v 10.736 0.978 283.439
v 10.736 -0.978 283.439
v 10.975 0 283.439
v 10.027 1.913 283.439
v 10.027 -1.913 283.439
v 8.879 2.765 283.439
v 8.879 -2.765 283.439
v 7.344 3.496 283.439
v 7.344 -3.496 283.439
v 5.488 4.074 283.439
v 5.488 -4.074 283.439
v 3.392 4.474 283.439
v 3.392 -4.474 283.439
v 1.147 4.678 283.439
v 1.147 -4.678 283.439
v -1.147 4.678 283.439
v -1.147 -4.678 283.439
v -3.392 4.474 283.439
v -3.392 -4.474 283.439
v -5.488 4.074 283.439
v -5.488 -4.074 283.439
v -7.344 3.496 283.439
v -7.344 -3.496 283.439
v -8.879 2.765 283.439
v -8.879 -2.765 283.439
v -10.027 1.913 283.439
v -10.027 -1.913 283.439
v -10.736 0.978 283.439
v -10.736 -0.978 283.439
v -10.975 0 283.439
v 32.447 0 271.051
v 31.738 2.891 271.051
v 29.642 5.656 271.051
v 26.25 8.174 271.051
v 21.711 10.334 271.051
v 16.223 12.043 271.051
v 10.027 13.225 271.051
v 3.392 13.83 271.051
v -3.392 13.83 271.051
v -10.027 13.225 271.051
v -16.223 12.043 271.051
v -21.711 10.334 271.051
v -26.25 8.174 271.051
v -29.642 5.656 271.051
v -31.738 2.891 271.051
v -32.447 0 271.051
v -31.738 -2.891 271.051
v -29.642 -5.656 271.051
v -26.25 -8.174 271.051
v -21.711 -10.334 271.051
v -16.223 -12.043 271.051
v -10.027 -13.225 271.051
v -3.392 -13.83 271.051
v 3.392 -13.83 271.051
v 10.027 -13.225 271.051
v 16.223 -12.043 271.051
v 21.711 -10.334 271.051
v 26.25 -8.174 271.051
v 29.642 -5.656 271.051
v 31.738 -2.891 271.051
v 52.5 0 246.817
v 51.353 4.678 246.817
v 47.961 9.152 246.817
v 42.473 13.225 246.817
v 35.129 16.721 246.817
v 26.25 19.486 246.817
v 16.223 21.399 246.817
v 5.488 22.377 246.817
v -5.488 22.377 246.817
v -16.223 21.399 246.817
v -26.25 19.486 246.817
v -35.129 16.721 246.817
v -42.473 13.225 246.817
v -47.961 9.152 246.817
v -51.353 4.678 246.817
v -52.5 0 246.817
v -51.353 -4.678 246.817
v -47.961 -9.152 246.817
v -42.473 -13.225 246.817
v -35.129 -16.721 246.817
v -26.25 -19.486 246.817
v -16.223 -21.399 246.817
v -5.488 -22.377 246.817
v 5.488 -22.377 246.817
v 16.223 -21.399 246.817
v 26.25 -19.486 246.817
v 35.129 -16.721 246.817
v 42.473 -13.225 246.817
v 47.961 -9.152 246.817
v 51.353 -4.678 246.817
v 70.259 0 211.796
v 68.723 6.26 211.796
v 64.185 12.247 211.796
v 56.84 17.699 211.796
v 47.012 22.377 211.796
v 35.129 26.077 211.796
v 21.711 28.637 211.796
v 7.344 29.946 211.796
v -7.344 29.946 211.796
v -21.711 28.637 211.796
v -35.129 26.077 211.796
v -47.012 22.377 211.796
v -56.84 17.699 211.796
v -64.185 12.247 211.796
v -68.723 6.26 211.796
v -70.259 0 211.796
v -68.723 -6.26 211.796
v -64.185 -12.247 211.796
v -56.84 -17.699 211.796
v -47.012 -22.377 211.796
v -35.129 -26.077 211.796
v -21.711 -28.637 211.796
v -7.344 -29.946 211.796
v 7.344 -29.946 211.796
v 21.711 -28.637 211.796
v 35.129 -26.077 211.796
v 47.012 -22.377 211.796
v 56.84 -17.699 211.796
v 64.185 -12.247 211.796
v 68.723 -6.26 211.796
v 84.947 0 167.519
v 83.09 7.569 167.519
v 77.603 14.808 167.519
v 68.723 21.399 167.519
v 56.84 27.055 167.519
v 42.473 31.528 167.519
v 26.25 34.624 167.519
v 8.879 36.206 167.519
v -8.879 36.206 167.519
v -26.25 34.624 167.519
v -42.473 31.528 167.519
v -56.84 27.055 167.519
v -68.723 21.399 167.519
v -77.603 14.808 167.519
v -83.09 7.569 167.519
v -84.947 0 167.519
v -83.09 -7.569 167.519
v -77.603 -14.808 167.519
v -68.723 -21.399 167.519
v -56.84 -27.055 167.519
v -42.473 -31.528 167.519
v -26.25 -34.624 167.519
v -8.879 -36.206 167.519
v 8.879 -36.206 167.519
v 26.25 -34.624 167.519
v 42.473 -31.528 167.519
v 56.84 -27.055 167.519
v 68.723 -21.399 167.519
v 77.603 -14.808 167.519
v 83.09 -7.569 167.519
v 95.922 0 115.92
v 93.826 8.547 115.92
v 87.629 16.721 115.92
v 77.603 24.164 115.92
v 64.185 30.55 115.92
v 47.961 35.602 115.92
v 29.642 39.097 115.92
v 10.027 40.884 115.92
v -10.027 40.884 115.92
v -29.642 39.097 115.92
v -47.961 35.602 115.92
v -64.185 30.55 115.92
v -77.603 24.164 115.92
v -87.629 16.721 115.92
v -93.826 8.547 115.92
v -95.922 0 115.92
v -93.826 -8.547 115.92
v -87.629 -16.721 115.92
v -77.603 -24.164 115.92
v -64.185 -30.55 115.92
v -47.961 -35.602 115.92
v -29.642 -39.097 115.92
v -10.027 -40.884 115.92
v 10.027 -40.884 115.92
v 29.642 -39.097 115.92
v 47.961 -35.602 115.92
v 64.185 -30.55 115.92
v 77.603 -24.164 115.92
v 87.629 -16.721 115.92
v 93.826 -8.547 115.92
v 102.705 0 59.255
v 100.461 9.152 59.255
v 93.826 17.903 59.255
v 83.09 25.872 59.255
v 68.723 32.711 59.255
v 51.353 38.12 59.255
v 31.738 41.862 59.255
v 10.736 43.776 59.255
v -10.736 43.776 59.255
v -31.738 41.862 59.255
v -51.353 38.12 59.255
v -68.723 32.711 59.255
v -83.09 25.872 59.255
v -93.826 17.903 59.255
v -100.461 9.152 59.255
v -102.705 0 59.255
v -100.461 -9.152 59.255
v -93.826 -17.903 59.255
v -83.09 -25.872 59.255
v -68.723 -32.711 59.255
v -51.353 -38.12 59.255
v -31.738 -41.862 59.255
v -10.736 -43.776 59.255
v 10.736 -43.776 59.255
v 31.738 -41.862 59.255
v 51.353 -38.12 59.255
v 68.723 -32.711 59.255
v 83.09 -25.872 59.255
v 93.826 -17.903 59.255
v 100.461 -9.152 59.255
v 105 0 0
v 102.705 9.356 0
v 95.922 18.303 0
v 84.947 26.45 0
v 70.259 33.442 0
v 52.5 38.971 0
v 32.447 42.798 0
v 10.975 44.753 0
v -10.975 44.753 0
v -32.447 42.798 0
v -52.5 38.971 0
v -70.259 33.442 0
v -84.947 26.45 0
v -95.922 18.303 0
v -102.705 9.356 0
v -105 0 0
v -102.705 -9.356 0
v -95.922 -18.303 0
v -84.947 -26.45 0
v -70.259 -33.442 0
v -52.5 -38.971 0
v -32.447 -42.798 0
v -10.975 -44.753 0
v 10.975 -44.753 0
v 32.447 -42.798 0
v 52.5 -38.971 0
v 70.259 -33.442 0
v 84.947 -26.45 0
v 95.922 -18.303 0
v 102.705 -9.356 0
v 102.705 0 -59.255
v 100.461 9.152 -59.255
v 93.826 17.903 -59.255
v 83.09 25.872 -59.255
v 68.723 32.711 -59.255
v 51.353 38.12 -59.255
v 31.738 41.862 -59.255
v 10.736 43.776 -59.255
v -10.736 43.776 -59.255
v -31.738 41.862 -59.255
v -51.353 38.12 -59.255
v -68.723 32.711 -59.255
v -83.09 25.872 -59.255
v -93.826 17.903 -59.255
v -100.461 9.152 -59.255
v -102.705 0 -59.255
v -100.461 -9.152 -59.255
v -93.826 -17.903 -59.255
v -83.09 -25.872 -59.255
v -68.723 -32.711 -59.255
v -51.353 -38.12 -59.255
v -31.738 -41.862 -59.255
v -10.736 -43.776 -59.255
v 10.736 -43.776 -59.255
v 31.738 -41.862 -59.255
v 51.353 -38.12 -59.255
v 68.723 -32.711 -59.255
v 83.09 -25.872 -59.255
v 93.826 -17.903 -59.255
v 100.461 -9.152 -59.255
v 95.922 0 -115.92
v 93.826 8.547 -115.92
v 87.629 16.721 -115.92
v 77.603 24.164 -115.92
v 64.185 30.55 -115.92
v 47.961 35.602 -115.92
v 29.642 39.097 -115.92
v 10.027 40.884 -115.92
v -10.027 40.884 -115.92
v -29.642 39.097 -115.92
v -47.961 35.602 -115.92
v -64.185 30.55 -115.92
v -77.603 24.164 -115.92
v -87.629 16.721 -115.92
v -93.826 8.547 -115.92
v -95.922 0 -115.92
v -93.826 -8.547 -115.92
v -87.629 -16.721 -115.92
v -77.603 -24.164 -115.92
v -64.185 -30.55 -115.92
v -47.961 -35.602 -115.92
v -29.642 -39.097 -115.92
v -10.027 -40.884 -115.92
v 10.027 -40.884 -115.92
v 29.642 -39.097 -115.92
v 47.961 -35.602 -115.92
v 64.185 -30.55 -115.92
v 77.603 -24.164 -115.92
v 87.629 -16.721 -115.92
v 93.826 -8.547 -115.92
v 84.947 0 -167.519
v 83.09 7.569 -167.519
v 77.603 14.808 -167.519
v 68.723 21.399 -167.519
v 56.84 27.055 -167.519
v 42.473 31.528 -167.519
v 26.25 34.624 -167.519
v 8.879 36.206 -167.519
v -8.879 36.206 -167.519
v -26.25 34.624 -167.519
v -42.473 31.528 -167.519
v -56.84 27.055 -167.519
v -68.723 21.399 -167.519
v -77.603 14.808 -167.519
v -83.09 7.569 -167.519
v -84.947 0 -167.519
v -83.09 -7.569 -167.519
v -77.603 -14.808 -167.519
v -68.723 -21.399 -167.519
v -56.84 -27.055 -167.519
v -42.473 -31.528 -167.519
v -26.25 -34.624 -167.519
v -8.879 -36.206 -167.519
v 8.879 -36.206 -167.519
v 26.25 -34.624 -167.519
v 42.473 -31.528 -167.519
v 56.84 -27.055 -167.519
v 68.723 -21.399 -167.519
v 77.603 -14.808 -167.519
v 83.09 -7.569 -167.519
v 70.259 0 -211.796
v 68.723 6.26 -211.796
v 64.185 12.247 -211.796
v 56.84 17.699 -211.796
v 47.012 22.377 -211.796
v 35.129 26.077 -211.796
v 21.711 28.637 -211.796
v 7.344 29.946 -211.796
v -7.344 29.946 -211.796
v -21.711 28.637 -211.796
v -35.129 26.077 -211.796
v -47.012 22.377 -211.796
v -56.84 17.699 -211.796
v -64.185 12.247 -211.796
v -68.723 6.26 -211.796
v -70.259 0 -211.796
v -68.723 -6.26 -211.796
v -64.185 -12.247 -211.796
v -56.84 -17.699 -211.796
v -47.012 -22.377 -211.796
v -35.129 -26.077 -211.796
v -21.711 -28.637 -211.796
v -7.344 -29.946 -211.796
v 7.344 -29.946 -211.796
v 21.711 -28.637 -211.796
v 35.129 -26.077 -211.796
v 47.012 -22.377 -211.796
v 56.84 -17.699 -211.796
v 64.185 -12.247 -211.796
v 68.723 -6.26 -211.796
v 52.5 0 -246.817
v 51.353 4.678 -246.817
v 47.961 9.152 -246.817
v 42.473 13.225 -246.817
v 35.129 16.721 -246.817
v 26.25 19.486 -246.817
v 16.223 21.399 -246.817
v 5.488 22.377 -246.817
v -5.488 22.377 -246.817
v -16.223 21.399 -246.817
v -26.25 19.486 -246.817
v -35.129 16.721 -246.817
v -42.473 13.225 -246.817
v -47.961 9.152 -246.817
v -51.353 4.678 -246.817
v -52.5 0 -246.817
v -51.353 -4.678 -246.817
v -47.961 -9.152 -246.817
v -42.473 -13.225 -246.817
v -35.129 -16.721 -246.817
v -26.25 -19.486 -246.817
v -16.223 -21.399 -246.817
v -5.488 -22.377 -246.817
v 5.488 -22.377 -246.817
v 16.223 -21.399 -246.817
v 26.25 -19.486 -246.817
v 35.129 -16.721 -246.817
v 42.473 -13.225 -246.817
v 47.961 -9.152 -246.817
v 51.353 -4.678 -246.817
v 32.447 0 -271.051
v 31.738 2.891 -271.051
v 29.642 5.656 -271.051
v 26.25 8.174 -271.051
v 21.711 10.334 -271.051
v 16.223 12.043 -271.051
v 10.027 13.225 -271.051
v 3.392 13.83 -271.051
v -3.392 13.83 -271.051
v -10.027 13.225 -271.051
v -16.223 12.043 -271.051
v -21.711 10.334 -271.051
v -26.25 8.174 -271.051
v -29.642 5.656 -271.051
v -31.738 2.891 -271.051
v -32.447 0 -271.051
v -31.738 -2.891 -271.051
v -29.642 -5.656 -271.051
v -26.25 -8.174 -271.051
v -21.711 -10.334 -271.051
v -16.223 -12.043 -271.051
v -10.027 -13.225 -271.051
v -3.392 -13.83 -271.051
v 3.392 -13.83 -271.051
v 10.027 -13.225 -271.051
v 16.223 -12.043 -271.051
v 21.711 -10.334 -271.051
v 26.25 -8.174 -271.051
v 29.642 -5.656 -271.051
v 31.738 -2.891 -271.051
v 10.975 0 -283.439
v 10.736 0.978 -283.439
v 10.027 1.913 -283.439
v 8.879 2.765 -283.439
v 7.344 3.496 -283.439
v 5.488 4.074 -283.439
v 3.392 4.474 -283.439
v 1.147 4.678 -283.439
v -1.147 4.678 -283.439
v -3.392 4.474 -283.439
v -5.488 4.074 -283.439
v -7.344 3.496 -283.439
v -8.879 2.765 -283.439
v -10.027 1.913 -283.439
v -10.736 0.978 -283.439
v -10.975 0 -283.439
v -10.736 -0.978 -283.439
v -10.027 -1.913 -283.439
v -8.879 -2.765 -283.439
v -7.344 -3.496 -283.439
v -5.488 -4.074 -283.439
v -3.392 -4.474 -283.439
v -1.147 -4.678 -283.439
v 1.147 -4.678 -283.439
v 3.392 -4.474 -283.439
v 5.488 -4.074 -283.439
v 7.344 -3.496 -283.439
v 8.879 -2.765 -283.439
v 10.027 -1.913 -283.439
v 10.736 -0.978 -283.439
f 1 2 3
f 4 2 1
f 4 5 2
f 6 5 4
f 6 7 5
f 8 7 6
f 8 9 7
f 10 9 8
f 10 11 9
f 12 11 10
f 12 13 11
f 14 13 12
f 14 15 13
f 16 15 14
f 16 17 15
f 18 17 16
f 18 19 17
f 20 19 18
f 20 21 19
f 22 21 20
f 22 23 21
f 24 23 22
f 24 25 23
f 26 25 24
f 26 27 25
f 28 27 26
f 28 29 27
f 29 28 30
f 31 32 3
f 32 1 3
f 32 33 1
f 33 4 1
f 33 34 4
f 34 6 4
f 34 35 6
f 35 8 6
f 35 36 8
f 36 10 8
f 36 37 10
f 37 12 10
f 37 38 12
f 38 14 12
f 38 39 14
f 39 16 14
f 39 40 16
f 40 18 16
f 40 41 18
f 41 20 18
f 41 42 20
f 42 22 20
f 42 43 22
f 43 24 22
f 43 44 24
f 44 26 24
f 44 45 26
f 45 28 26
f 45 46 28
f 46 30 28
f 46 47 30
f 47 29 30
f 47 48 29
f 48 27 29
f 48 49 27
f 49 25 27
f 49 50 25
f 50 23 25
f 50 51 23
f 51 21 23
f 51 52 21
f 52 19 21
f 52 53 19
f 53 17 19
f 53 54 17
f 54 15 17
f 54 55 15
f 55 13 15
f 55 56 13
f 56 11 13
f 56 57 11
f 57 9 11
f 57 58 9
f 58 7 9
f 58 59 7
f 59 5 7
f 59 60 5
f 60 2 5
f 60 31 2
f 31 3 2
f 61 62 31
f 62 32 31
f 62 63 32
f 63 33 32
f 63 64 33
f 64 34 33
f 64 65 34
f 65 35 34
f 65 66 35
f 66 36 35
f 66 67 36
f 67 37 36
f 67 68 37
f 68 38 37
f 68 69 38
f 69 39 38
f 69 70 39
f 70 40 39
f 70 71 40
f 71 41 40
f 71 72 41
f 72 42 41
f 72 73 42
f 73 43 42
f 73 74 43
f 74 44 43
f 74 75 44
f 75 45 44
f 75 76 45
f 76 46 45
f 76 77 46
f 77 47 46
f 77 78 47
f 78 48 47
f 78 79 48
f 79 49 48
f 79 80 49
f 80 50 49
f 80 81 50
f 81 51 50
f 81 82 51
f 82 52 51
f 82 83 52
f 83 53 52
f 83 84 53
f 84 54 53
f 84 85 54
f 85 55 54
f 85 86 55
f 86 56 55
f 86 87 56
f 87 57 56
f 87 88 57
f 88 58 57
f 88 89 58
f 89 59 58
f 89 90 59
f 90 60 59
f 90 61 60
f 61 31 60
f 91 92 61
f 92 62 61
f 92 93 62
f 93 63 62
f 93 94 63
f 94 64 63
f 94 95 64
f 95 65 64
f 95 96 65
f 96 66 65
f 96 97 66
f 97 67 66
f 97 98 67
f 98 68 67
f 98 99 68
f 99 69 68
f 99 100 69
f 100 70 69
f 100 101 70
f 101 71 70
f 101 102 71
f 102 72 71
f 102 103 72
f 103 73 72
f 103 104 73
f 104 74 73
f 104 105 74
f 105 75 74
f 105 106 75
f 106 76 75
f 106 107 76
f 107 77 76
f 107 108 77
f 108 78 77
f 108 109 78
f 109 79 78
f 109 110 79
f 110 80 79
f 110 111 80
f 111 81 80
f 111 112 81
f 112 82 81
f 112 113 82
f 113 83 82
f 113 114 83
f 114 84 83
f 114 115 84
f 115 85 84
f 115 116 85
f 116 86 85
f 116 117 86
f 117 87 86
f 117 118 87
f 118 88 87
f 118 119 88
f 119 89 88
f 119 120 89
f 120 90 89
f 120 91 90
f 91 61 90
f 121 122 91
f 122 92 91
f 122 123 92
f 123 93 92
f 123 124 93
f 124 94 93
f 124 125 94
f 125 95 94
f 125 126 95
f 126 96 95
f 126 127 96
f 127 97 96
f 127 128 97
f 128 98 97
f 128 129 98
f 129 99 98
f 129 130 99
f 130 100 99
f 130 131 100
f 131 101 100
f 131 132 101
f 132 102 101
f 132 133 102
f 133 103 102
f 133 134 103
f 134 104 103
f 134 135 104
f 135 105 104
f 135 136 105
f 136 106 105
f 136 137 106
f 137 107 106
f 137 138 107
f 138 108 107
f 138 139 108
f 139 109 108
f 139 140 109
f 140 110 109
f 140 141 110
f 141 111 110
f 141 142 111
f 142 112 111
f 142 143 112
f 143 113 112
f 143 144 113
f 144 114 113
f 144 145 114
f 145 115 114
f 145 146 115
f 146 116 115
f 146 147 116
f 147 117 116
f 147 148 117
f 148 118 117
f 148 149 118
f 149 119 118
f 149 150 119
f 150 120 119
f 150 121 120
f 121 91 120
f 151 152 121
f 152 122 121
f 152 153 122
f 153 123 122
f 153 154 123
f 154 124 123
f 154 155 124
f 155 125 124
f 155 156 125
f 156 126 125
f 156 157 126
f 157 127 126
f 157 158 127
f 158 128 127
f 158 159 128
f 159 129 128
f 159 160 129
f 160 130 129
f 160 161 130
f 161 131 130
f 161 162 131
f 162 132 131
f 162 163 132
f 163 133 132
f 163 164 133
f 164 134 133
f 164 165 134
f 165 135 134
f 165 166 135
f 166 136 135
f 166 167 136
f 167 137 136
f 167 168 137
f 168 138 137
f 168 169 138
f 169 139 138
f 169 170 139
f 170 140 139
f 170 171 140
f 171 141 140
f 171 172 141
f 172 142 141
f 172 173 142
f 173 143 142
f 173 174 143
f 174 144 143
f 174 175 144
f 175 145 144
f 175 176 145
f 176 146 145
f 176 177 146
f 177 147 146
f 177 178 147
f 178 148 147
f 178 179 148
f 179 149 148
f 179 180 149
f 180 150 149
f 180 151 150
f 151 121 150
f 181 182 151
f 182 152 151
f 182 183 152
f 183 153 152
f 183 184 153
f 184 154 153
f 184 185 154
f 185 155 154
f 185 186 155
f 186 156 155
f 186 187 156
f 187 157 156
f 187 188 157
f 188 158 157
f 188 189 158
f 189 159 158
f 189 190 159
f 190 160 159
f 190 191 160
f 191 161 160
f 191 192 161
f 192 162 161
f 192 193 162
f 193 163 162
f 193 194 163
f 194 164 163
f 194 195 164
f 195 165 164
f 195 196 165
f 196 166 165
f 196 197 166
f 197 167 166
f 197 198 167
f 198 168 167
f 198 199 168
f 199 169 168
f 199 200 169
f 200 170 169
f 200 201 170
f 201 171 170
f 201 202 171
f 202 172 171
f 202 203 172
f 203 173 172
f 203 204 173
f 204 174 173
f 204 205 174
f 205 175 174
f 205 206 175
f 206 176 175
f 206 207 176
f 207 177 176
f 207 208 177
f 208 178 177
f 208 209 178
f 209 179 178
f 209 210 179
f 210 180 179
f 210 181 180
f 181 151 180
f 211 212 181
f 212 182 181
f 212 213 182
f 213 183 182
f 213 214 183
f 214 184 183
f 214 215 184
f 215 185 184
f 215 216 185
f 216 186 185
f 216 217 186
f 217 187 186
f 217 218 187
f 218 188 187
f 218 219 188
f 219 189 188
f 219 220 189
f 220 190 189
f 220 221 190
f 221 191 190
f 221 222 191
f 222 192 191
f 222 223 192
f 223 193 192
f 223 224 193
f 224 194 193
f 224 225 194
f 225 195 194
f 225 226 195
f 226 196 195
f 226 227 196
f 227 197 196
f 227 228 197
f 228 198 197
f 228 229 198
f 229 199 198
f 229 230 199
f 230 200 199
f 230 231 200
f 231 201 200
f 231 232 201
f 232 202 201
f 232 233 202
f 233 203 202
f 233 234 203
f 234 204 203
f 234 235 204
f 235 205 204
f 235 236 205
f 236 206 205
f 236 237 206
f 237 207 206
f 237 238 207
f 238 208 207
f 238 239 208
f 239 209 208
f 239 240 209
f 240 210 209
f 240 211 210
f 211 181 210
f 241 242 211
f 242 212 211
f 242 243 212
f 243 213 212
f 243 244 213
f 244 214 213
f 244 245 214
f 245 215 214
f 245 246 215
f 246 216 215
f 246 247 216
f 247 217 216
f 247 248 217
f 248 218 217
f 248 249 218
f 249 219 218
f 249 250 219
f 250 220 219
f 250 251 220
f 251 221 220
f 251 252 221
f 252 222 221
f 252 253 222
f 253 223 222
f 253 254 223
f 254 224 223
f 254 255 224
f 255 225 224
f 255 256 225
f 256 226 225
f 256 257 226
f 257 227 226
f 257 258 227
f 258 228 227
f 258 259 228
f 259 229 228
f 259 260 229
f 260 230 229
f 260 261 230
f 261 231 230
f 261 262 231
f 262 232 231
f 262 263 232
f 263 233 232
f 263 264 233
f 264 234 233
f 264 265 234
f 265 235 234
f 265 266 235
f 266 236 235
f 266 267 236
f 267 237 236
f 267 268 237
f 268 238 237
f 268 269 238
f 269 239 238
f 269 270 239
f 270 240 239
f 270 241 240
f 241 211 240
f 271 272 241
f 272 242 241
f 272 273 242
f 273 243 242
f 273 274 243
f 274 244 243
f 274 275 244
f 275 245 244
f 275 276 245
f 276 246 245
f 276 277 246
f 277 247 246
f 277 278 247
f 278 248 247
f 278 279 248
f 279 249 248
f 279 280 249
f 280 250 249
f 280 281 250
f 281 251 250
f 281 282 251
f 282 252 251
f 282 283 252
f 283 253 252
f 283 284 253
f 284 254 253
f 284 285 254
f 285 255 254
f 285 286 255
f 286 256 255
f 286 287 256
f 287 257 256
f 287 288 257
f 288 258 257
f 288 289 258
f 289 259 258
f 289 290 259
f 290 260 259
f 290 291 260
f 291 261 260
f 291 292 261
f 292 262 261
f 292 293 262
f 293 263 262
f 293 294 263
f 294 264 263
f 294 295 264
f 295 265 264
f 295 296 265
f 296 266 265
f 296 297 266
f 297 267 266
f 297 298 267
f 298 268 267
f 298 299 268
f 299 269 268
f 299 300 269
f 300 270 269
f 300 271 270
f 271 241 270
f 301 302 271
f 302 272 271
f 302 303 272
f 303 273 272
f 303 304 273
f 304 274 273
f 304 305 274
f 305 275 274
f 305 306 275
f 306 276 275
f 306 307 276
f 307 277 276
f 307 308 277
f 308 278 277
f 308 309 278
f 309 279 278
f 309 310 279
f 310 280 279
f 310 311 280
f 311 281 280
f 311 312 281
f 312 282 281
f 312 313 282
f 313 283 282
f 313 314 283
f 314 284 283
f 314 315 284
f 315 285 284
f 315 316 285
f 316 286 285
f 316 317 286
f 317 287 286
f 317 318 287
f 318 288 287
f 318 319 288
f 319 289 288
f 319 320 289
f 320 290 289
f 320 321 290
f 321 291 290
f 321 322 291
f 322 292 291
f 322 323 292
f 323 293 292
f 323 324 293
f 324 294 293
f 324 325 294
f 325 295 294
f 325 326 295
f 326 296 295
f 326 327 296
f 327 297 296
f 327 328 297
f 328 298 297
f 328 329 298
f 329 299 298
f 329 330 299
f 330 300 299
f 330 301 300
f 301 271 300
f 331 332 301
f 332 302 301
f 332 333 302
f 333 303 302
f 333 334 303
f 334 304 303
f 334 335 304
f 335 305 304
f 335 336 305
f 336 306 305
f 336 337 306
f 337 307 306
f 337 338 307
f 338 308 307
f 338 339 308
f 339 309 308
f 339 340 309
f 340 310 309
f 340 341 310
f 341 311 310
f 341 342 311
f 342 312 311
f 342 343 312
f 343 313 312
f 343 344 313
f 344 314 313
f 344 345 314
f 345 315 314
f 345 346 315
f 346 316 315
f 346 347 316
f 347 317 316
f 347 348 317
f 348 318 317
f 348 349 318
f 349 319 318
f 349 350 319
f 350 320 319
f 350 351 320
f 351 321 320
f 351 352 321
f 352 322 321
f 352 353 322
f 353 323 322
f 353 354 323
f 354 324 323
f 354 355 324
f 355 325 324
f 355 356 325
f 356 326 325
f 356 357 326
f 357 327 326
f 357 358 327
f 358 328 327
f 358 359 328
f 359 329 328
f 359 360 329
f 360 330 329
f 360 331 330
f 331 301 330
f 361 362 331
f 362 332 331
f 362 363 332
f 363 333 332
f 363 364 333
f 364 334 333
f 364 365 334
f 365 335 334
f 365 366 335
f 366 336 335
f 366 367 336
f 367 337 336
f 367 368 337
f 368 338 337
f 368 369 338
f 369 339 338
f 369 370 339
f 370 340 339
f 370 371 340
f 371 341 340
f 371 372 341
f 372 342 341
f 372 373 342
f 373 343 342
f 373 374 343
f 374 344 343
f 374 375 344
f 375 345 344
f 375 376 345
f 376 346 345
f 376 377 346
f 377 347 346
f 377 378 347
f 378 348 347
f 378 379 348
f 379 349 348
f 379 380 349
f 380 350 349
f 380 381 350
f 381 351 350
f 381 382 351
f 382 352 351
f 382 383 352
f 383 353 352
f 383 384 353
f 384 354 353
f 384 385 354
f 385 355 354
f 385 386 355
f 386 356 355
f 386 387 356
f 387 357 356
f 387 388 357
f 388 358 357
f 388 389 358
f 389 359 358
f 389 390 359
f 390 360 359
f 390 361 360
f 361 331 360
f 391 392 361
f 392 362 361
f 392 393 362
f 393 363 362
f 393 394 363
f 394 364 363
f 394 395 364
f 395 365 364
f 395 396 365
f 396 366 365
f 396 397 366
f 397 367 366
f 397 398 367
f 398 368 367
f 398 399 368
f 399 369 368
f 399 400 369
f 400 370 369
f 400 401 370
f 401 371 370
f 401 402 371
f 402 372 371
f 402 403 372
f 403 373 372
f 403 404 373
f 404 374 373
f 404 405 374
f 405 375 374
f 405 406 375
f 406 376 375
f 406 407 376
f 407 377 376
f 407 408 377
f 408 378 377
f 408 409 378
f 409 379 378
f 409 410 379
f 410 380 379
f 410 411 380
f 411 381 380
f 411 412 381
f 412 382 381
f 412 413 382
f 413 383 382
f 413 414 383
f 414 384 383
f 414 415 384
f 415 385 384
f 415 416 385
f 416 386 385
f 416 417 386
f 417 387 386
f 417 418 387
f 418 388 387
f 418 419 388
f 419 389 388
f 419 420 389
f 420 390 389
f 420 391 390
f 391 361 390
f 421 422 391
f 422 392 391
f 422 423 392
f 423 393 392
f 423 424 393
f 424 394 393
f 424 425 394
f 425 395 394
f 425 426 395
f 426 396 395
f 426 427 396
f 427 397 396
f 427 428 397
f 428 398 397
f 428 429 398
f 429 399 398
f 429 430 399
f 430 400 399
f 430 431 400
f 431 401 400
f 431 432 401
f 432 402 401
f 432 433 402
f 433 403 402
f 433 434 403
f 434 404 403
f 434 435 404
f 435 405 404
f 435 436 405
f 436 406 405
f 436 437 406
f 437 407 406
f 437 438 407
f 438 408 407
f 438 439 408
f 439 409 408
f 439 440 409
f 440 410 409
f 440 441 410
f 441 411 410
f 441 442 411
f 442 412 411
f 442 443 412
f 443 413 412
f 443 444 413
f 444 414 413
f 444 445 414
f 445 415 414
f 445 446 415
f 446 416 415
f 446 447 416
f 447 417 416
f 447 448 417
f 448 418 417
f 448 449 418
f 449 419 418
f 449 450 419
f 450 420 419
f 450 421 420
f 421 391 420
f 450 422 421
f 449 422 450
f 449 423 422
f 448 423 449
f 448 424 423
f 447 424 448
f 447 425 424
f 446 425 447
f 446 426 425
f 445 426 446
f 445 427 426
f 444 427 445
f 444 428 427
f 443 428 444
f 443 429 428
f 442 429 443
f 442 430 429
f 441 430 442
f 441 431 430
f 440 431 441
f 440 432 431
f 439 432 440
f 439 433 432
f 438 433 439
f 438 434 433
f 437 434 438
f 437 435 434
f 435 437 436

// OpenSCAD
// Generated by SolidPython 1.0.1 on 2020-07-29 00:46:47


scale(v = [7, 3, 19]) {
	sphere(r = 15);
}
/***********************************************
*********      SolidPython code:      **********
************************************************
 
# import packages: SolidPython
from solid import *
from solid.utils import *
from itertools import chain, combinations, permutations


class Resize:

    def __init__(self, scad_file):
        self.scad_file = scad_file
        #self.scad_file = import_scad(scad_file)
        # cone/cylinder param:
        self.r1 = 0
        self.r2 = 0
        self.h = 0
        # rectangular prism param:
        self.w = 0
        self.l = 0
        # ellipse param:
        self.r = 0

    # import OpenScad code (file name corresponds to shape)


    # classify shape + parameters
    def assign(self, param1, param2, param3):
        if self.scad_file == 'cone.scad':
            self.r1 = param1
            self.r2 = param2
            self.h = param3
        elif self.scad_file == 'cylinder.scad':
            self.r1 = param1
            self.r2 = param2
            self.h = param3
        elif self.scad_file == 'rectangularPrism.scad':
            self.h = param1
            self.l = param2
            self.w = param3
        else:
            self.r = param1
            self.h = param2

    # resize parameters
    def iterate(self):
        x = range(3, 20, 2)
        i = 1
        if self.scad_file == 'cone.scad':
            tempList = list(permutations(x, 2))
            for temp in tempList:
                param1 = temp[0]
                param2 = temp[1]
                filepath = 'produced_scad_files/' + 'cone' + str(param1) + '_' + str(param2) + '_' + '.scad'
                scad_render_to_file(cylinder(h=param1, r1=param2, r2=0), filepath)

        elif self.scad_file == 'cylinder.scad':
            tempList = list(permutations(x, 3))
            for temp in tempList:
                param1 = temp[0]
                param2 = temp[1]
                filepath = 'produced_scad_files/' + 'cylinder' + str(param1) + '_' + str(param2) + '_' + '.scad'
                scad_render_to_file(cylinder(h=param1, r1=param2, r2=param2), filepath)

        elif self.scad_file == 'rectangularPrism.scad':
            tempList = list(permutations(x, 3))
            for temp in tempList:
                param1 = temp[0]
                param2 = temp[1]
                param3 = temp[2]
                filepath = 'produced_scad_files/' + 'rectangularPrism' + str(param1) + '_' + str(param2) + '_' + str(
                    param3) + '.scad'
                scad_render_to_file(cube(size=(param1, param2, param3)), filepath)

        elif self.scad_file == 'ellipse.scad':
            tempList = list(permutations(x, 4))
            for temp in tempList:
                param1 = temp[0]
                param2 = temp[1]
                param3 = temp[2]
                param4 = temp[3]
                filepath = 'produced_scad_files/' + 'ellipse' + str(param1) + '_' + str(param2) + '_' + str(param3) + '_' + str(param4) + '.scad'
                scad_render_to_file(scale([param1, param2, param3])(sphere(r=param4)), filepath)

    def render_to_scadfile(self):
        scad_render_to_file(scad, 'example.scad') 
 
************************************************/
